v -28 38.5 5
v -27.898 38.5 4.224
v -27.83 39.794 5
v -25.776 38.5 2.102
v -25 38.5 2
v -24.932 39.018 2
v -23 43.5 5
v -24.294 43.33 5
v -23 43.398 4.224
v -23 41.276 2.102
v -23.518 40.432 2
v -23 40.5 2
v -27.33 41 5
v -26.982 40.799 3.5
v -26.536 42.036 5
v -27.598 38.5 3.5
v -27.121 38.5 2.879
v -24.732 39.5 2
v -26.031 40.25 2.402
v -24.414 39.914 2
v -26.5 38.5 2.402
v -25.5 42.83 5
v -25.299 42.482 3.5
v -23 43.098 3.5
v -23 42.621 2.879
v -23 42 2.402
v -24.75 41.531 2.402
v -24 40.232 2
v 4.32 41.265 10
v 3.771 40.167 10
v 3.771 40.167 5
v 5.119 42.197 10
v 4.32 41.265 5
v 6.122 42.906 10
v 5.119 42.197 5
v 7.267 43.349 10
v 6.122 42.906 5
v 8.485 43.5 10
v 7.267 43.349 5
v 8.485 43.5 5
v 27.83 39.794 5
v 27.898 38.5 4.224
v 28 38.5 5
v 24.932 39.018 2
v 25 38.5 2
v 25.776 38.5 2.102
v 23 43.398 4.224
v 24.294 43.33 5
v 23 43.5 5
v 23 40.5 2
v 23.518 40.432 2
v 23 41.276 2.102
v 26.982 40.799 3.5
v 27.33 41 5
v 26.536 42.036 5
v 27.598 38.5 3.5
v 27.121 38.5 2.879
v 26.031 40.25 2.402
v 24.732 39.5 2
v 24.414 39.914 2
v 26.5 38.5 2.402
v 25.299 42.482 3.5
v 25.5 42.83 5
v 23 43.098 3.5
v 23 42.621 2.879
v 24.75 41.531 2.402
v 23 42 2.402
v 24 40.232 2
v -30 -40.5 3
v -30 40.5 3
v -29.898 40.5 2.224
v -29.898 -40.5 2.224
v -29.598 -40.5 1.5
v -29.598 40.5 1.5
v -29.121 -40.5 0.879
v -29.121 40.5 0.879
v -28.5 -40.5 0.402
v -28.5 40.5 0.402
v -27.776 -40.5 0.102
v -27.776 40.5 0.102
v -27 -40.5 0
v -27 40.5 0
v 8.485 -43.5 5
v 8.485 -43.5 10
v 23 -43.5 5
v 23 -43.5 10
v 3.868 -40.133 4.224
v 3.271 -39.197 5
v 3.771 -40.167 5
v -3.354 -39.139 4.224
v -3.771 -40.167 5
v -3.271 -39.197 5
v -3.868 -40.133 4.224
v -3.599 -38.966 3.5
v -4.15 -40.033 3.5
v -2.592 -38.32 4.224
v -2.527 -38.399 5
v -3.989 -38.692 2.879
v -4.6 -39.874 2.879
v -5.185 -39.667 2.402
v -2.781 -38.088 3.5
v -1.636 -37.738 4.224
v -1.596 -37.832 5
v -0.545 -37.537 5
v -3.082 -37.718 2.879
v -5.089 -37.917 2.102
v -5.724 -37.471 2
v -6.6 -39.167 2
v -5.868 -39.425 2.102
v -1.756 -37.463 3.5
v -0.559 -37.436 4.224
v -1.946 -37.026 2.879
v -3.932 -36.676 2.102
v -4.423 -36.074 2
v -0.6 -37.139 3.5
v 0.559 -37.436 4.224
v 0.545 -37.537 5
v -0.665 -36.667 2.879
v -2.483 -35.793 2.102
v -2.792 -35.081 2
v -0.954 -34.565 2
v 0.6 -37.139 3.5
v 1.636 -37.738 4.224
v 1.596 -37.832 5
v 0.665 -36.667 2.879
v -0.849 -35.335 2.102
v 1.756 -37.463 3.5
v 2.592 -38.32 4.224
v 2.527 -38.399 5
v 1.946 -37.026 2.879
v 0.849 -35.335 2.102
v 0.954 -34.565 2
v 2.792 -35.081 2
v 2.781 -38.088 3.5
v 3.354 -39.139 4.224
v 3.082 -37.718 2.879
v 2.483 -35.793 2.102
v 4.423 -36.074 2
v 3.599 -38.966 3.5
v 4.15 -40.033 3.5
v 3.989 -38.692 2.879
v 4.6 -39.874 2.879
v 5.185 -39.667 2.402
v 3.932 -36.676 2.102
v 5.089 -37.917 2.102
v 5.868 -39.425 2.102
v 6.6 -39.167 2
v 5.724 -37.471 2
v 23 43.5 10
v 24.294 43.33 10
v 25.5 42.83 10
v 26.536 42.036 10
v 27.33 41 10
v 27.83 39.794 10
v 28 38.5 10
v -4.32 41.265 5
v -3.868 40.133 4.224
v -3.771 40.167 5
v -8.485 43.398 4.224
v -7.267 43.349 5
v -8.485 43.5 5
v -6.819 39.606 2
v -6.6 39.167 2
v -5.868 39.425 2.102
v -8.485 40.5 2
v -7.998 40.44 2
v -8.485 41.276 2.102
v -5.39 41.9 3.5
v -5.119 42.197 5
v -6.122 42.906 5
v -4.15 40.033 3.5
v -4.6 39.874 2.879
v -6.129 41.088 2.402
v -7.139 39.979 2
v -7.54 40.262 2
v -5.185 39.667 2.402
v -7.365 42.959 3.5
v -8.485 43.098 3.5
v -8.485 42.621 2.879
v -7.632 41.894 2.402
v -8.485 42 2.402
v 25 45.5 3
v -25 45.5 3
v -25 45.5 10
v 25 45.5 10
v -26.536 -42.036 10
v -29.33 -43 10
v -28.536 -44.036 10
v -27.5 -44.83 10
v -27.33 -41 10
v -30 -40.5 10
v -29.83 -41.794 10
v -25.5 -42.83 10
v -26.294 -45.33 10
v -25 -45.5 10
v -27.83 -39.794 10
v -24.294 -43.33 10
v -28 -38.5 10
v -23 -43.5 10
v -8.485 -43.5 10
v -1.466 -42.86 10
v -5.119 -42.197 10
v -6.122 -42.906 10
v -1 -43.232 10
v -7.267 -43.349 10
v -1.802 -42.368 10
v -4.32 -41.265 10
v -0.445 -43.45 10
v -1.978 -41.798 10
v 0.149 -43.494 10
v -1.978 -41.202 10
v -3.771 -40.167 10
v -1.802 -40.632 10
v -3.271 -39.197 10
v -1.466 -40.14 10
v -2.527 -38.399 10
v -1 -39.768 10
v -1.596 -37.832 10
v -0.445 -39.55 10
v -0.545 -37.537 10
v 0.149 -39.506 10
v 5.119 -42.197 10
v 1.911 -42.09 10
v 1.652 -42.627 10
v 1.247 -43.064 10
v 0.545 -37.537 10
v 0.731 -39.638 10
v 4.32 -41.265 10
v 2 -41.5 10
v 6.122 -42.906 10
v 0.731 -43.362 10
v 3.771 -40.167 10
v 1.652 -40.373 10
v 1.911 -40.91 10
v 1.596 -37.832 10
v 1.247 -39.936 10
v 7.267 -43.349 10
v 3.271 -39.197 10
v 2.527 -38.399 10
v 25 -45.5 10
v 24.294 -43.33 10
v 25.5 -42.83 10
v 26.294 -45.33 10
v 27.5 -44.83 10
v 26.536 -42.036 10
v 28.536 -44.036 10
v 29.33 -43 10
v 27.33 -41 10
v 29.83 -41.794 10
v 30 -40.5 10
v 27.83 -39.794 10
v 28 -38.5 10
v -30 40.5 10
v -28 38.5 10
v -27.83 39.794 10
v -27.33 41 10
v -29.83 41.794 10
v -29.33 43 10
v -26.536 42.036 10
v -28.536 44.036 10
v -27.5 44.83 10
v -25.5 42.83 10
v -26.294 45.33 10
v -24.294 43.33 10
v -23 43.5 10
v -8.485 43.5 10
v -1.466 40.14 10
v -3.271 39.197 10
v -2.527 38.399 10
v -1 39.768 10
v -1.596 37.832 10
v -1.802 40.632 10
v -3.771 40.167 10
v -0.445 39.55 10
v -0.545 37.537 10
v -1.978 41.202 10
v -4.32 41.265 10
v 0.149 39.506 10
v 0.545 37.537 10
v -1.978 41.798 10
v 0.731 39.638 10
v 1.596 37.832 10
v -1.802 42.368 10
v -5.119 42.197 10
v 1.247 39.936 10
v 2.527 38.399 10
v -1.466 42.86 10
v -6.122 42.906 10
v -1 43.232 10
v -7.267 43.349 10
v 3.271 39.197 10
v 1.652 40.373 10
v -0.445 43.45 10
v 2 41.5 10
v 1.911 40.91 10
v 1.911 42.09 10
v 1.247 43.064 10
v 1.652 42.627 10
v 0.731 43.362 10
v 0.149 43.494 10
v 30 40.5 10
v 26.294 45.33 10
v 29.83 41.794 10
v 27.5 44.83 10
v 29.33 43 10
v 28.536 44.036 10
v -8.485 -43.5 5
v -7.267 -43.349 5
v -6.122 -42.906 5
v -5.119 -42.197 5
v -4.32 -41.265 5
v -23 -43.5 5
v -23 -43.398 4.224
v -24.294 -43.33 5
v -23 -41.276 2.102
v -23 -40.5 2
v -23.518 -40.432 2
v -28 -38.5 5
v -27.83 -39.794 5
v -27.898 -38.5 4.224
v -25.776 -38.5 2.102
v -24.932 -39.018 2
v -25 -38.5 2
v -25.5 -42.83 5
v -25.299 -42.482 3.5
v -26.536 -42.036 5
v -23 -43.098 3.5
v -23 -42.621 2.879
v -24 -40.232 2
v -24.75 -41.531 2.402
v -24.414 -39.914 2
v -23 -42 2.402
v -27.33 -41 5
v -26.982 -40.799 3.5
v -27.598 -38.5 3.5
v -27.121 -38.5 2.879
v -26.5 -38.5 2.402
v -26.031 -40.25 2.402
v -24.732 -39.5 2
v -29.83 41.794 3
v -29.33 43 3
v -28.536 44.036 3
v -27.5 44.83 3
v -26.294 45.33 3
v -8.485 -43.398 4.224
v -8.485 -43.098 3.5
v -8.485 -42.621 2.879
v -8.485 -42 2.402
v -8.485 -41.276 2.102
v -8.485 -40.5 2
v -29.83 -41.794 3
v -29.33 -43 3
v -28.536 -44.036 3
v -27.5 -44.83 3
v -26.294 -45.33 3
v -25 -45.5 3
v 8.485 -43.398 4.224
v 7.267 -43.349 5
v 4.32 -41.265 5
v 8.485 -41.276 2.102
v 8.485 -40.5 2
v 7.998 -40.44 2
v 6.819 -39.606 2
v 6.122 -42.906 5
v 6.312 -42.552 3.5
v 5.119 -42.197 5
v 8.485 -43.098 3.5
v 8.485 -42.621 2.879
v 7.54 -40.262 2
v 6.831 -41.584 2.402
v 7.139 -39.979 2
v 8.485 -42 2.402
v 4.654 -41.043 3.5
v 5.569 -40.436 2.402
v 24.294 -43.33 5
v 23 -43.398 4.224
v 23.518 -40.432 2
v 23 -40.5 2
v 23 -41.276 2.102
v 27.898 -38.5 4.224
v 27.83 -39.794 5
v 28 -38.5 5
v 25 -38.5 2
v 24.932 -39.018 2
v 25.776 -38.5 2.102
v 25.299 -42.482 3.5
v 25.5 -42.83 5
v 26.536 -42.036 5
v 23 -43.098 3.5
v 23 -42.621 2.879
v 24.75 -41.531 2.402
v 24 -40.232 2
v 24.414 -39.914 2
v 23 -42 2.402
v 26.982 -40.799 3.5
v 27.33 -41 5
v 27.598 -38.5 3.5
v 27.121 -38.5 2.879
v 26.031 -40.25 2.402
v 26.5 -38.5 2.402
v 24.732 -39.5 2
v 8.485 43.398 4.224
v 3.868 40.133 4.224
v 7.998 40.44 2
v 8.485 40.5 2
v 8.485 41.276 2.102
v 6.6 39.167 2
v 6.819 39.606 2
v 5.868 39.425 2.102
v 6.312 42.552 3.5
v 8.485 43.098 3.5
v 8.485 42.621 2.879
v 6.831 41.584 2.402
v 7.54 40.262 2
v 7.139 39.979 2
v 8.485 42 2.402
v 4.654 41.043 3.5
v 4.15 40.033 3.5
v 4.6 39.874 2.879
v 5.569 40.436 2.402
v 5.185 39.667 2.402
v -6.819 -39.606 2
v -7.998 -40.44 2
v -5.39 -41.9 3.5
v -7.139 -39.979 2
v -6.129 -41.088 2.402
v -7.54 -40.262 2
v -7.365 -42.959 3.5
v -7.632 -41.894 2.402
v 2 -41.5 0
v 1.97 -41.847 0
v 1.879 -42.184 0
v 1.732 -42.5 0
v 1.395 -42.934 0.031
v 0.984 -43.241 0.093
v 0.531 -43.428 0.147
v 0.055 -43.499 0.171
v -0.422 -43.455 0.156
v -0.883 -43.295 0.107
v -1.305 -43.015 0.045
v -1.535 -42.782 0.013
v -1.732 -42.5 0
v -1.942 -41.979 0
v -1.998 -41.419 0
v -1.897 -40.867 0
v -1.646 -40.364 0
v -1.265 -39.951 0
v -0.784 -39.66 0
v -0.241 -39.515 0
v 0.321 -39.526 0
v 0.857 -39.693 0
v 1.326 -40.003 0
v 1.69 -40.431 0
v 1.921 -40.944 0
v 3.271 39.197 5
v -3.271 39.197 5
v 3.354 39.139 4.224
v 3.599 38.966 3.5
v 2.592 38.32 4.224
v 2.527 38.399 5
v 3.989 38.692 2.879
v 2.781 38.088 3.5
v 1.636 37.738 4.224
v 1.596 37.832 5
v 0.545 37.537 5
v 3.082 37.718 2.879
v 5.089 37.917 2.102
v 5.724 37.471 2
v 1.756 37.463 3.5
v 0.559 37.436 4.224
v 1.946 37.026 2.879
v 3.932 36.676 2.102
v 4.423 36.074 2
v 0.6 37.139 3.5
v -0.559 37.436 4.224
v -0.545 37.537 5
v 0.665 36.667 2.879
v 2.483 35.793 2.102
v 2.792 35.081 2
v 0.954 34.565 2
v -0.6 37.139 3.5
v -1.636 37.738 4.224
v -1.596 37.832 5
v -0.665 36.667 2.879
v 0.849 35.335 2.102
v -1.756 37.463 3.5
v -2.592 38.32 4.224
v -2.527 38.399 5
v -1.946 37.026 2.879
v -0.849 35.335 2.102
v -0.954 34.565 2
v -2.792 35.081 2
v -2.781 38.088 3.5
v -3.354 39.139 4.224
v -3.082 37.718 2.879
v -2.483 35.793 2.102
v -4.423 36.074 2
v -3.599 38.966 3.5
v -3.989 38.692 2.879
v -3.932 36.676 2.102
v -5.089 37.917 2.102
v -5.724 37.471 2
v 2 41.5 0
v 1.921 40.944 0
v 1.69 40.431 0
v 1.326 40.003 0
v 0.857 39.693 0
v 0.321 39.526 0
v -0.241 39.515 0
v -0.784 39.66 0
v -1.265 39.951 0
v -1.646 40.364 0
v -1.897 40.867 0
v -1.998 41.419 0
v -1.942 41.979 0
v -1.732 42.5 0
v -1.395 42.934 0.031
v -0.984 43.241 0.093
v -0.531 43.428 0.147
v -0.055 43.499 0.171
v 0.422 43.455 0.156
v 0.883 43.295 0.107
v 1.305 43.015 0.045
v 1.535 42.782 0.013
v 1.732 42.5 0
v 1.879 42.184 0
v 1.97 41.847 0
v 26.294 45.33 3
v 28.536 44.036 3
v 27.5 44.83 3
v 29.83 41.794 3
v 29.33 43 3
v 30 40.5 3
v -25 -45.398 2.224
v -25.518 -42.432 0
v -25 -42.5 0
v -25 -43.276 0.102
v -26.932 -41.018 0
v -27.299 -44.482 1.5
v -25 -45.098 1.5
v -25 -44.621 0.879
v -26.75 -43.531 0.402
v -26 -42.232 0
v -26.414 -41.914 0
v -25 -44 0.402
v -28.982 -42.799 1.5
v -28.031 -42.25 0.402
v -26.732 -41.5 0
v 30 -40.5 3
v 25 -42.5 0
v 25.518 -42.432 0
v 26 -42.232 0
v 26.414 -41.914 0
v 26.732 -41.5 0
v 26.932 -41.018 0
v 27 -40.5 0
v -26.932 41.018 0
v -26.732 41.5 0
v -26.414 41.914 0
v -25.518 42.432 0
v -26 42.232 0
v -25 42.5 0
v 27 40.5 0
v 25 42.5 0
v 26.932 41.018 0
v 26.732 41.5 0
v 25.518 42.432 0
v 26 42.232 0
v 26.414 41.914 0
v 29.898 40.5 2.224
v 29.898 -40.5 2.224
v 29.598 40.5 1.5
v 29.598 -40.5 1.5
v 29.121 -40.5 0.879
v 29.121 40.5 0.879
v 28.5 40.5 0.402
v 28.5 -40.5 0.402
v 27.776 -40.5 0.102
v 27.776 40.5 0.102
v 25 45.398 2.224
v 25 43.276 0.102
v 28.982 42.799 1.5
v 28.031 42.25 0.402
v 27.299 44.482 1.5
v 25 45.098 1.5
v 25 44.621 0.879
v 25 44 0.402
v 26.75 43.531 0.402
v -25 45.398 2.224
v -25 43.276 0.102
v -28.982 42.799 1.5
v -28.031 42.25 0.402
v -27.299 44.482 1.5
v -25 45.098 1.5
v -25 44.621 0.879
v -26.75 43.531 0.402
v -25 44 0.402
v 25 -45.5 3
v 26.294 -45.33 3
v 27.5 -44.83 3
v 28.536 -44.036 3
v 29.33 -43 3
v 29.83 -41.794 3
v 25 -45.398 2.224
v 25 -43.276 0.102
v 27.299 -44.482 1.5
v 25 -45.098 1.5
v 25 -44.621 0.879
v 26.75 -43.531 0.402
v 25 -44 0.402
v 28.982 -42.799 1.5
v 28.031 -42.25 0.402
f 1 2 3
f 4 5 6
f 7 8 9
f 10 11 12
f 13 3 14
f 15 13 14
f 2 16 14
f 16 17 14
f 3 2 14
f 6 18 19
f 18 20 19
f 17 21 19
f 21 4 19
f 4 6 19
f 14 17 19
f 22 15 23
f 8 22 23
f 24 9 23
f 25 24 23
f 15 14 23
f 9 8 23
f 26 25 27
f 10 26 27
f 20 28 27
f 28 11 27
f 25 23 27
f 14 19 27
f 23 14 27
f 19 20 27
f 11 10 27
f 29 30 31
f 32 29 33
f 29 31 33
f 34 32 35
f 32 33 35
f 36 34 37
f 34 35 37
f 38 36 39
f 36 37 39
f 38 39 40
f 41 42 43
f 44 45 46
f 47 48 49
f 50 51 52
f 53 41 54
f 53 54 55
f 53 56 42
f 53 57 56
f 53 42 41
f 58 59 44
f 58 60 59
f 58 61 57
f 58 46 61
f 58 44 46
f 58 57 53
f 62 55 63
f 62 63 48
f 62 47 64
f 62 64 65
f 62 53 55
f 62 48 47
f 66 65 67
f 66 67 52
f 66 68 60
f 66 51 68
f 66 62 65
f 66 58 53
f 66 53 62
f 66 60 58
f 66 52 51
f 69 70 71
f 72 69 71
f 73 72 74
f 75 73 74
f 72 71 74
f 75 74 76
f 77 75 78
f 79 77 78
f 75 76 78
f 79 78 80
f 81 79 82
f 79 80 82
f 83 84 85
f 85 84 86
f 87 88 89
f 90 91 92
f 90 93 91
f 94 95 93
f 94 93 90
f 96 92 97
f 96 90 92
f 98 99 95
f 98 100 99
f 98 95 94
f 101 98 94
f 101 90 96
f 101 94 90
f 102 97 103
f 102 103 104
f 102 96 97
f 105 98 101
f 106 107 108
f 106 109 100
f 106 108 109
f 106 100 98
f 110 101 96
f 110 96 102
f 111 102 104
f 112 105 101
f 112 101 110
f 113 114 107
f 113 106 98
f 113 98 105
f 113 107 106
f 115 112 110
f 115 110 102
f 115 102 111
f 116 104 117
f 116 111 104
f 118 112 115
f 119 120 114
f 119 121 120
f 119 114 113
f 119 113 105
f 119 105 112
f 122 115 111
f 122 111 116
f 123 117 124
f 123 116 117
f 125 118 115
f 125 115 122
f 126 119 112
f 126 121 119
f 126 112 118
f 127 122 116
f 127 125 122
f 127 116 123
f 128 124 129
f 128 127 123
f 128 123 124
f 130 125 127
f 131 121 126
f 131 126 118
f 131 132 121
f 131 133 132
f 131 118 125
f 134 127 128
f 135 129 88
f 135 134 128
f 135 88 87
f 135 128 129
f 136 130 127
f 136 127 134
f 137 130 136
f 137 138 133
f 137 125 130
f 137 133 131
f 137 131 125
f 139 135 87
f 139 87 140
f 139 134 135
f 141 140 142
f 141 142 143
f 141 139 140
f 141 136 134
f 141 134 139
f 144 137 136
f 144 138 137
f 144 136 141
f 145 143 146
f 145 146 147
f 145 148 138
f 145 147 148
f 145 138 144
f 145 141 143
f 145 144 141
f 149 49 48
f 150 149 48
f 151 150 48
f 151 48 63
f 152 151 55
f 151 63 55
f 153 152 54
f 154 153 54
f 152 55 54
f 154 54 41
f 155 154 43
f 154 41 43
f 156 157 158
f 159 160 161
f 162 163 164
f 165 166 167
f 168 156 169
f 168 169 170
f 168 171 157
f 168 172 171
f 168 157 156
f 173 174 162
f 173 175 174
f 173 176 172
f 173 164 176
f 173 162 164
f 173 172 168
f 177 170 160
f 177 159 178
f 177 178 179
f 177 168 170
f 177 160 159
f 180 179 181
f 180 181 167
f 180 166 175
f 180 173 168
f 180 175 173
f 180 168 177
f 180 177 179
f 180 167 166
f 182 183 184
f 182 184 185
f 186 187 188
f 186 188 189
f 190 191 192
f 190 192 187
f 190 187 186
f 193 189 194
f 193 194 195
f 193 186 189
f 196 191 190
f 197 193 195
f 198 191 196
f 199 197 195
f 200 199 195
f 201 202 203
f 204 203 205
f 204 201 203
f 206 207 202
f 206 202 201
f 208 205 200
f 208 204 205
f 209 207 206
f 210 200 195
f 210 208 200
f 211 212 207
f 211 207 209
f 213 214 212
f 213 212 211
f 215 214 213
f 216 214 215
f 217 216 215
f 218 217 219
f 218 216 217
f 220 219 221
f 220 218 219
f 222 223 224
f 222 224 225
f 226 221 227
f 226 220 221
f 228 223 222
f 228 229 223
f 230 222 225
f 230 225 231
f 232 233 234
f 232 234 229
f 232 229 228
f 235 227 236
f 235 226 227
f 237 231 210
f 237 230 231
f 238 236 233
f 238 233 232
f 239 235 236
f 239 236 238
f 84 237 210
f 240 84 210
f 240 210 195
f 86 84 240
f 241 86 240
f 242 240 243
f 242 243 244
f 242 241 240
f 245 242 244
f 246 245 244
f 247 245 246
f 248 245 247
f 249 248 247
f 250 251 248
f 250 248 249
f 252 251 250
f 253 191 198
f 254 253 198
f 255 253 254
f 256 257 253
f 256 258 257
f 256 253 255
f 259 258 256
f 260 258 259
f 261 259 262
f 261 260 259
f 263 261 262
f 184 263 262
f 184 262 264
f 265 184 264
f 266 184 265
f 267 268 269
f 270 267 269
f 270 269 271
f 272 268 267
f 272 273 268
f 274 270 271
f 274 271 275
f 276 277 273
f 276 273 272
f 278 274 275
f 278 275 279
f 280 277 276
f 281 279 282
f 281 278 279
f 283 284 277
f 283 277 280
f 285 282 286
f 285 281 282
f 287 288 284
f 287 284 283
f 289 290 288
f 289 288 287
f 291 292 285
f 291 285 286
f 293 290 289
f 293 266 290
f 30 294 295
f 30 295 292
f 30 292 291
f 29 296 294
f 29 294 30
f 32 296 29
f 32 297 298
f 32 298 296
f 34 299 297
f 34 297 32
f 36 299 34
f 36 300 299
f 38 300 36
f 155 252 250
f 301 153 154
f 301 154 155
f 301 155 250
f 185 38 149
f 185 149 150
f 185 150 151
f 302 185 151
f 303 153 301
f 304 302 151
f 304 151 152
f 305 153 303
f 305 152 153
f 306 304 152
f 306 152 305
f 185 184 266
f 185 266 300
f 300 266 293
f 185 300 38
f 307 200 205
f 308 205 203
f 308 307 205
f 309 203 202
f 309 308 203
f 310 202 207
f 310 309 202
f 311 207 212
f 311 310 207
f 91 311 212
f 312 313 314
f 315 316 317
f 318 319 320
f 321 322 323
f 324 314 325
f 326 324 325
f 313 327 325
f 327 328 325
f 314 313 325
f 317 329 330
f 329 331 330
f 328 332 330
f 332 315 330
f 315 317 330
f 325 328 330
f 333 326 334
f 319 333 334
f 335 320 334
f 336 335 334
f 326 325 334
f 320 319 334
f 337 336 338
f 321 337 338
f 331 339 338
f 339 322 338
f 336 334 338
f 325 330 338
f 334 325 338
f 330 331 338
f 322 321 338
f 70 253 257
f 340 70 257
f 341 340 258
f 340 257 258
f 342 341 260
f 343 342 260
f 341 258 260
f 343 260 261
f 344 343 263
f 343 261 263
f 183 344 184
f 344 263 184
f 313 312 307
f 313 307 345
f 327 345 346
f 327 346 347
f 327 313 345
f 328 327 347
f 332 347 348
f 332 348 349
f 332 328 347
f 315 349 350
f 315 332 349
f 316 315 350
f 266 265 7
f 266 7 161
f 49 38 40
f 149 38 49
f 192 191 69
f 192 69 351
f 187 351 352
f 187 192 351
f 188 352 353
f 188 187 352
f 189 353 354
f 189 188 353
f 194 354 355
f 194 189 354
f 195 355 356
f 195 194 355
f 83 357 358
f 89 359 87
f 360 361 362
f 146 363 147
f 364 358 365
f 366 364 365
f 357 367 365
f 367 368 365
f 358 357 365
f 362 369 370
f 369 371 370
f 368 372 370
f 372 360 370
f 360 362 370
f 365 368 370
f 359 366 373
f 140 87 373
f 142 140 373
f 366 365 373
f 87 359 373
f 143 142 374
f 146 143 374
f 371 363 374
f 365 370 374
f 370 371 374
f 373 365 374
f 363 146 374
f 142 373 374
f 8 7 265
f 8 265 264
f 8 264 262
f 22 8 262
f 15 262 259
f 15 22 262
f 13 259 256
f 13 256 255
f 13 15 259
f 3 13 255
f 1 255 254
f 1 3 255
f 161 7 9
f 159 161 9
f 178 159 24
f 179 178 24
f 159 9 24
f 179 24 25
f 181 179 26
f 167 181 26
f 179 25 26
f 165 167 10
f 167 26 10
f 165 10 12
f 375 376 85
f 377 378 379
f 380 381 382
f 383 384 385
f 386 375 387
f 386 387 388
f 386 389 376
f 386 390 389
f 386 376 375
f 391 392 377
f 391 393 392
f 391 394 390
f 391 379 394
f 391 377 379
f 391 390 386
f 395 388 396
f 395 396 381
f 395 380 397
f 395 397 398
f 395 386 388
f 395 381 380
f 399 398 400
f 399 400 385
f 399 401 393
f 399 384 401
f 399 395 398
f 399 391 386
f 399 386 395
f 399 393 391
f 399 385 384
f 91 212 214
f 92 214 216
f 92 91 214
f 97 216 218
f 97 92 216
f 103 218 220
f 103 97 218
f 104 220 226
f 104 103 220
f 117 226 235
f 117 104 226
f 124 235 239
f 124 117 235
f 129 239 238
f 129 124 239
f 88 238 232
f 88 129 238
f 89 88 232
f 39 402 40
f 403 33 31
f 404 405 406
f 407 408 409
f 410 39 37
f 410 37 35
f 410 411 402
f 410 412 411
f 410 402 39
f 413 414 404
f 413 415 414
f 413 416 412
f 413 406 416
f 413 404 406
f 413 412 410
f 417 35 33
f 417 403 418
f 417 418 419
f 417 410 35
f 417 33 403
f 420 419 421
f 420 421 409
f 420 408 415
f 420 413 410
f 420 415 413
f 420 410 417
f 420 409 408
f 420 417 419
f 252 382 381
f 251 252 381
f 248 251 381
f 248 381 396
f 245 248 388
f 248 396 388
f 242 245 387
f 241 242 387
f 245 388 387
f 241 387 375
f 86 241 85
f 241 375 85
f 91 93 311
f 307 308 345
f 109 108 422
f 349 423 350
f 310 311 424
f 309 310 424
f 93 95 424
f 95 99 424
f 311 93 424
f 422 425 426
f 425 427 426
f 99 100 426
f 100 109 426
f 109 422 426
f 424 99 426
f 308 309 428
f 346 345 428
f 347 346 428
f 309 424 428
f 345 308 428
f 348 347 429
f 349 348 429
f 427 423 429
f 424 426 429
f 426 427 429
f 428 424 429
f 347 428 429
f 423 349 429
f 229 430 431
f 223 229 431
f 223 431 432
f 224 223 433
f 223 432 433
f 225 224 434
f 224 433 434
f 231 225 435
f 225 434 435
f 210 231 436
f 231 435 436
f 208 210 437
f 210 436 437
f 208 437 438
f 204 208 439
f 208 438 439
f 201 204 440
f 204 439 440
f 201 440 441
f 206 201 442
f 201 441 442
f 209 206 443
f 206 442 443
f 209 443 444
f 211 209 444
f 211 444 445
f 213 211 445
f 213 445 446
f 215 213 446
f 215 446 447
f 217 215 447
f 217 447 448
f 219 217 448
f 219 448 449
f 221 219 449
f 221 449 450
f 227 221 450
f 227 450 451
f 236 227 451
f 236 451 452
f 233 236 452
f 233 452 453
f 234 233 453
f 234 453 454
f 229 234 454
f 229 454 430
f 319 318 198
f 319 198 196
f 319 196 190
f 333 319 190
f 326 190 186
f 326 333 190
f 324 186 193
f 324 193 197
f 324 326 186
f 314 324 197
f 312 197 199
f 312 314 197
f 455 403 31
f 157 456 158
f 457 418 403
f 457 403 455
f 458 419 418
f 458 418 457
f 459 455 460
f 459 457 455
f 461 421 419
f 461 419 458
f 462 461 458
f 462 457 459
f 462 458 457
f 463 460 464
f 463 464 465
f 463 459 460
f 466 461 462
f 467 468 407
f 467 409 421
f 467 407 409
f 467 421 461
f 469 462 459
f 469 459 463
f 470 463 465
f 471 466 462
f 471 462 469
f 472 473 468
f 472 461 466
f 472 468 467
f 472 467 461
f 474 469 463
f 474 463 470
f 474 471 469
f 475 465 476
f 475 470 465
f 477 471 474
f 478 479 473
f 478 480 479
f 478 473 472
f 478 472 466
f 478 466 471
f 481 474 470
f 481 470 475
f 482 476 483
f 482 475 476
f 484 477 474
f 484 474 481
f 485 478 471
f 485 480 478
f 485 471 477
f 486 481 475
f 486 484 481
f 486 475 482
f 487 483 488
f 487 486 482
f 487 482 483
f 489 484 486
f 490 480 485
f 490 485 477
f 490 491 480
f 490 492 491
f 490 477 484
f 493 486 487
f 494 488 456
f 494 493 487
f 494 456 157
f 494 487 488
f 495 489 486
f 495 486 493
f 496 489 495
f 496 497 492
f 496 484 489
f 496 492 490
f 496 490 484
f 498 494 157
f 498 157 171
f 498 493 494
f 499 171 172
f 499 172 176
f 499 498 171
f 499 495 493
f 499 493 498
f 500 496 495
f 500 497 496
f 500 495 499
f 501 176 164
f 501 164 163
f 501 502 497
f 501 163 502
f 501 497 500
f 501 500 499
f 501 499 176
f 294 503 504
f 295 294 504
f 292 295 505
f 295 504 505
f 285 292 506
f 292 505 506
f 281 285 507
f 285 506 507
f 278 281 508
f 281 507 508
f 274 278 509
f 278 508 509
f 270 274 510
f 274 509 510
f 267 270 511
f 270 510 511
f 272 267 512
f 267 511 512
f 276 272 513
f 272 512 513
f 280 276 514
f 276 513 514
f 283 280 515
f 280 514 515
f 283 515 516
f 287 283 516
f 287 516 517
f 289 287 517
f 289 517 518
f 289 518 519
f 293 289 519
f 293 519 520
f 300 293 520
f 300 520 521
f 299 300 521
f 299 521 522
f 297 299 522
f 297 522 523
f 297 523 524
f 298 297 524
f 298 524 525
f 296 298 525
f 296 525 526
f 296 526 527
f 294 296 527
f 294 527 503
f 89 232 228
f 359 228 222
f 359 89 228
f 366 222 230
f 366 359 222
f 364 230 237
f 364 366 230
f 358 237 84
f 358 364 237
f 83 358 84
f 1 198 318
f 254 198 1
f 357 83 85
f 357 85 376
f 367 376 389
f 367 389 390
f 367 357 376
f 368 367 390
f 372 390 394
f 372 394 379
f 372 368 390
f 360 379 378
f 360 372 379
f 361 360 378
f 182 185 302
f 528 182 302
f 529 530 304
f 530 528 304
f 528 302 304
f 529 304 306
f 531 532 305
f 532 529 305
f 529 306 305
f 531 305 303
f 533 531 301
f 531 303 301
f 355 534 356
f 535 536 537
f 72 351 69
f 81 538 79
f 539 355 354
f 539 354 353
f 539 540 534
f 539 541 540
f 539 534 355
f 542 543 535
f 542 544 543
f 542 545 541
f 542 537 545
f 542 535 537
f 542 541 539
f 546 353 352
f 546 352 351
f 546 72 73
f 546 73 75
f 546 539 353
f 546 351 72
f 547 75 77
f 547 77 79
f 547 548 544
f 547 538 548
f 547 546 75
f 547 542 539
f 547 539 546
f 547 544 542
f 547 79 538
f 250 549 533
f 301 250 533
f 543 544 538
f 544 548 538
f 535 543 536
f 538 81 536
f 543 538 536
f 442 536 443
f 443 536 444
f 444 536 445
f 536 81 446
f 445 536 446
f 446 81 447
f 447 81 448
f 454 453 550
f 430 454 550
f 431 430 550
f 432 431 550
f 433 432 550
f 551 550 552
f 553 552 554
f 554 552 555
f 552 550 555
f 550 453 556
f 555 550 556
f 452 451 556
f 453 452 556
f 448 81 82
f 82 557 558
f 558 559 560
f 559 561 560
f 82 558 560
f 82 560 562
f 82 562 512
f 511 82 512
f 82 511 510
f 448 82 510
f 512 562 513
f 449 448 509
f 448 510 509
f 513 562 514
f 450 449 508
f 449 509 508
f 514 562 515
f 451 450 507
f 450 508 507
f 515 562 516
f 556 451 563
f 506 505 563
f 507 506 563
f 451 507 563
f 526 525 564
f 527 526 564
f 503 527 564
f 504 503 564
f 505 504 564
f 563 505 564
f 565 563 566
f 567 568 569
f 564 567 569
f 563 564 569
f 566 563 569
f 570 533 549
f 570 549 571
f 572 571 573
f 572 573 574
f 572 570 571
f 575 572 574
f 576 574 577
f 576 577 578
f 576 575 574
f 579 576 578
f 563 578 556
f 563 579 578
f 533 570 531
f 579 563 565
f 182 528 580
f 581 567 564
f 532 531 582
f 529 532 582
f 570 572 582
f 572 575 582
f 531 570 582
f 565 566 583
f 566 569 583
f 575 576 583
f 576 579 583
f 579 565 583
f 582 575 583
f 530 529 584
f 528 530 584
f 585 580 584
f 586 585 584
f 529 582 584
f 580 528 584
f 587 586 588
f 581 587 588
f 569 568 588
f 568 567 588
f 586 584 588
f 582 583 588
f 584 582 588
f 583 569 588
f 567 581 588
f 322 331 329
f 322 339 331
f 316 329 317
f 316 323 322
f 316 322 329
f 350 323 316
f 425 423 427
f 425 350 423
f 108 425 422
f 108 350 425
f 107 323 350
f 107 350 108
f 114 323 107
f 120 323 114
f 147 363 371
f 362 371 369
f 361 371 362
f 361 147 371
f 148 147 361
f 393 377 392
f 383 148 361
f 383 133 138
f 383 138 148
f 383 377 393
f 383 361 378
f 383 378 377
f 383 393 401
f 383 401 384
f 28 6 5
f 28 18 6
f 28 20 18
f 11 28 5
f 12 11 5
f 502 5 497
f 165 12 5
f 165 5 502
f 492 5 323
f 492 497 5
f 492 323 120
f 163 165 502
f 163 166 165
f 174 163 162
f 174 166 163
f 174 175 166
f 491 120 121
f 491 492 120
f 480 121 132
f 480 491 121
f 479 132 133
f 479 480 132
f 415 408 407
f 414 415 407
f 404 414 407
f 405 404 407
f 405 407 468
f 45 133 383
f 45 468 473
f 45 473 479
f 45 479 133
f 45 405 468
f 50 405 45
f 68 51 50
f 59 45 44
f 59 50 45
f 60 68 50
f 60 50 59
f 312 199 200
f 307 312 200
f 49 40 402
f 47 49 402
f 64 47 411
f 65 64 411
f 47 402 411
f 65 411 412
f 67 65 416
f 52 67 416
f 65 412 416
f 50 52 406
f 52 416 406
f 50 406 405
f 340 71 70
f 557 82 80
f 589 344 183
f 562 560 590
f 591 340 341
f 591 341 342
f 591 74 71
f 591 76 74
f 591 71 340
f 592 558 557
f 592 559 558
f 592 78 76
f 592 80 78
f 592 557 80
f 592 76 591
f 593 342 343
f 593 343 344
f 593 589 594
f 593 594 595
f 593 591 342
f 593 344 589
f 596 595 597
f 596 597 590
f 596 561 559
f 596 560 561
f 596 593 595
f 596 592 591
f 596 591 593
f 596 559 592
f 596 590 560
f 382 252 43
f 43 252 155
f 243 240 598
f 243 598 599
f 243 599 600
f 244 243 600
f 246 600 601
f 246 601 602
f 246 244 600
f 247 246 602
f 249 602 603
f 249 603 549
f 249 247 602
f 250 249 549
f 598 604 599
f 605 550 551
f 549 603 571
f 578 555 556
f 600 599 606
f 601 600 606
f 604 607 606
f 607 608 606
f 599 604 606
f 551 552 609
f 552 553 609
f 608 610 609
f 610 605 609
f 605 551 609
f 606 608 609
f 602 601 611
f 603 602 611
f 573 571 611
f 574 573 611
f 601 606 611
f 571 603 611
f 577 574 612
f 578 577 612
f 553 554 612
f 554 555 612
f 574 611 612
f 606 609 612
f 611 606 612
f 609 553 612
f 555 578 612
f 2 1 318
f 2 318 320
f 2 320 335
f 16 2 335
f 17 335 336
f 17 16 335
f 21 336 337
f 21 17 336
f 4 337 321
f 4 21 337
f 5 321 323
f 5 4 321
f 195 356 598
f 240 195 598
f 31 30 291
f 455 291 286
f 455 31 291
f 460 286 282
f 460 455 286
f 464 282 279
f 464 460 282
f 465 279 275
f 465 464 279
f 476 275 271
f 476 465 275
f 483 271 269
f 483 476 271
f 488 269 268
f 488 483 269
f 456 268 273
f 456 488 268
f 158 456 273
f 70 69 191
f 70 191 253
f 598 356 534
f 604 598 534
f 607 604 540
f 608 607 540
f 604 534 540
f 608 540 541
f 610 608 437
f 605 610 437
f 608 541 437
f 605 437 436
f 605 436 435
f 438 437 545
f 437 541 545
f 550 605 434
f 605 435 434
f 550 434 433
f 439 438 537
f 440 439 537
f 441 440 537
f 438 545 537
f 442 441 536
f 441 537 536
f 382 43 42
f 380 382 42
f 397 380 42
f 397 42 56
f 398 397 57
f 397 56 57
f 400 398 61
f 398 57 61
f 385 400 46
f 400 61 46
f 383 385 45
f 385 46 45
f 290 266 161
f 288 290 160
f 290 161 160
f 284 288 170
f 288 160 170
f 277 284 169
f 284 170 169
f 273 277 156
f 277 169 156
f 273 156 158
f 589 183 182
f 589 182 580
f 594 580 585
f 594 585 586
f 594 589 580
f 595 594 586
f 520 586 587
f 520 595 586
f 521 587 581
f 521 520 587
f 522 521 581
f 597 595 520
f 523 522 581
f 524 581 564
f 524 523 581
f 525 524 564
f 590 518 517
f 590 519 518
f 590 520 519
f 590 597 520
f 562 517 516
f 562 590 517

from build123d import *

# Parameters (mm, degrees)
F3_W          = 60
F3_H          = 91
F4_DEPTH      = 10
F5_W          = 56
F5_H          = 87
F6_DEPTH      = 8
F7_R          = 4
F8_DEPTH      = 10
F9_R          = 2
F10_DEPTH     = 10.001
F11_R         = 5
F12_R         = 5
F13_T1_DEPTH  = 77
F13_T3_DEPTH  = 14.5147186258
F13_T5_DEPTH  = 14.5147186258
F13_T8_ANGLE  = 90
F13_T10_ANGLE = 70.5287793655
F13_T12_ANGLE = 141.057558731
F13_T14_ANGLE = 90
F13_T16_ANGLE = 70.5287793655
F13_T18_ANGLE = 70.5287793655
F13_T20_ANGLE = 90
F13_T22_ANGLE = 141.057558731
F13_T24_ANGLE = 70.5287793655
F13_T26_ANGLE = 90
F13_T27_DEPTH = 81
F13_T29_DEPTH = 50
F13_T32_ANGLE = 90
F13_T34_ANGLE = 90
F13_T36_ANGLE = 90
F13_T38_ANGLE = 90


# Not quite as in the source:
# - a fillet or chamfer that OpenCascade refuses, or shapes differently, is made with other operations: its cross-section is extruded or revolved along the edge and cut away or added


with BuildPart() as f4:
    # F3 (on Top) → F4 (new body)
    with BuildSketch(Plane.XY):
        Rectangle(F3_W, F3_H)
    extrude(amount=F4_DEPTH)

    # F5 (on face) → F6 (cut)
    with BuildSketch(Plane.XY.offset(10)):
        Rectangle(F5_W, F5_H)
    extrude(amount=-F6_DEPTH, mode=Mode.SUBTRACT)

    # F7 (on face) → F8 (join)
    with BuildSketch(Plane(origin=(0, 0, 0), x_dir=(1, 0, 0), z_dir=(0, 0, -1))):
        with Locations((0, -41.5)):
            Circle(F7_R)
        with Locations((0, 41.5)):
            Circle(F7_R)
    extrude(amount=-F8_DEPTH)

    # F9 (on face) → F10 (cut, through all)
    with BuildSketch(Plane(origin=(0, 0, 0), x_dir=(1, 0, 0), z_dir=(0, 0, -1))):
        with Locations((0, -41.5)):
            Circle(F9_R)
        with Locations((0, 41.5)):
            Circle(F9_R)
    extrude(amount=-F10_DEPTH, mode=Mode.SUBTRACT)

    # F11
    f11_edges = [f4.edges().sort_by_distance(p)[0] for p in [
        (3.464102, 43.5, 6),
        (-3.464102, 43.5, 6),
        (-3.464102, -43.5, 6),
        (3.464102, -43.5, 6),
    ]]
    fillet(f11_edges, radius=F11_R)

    # F12
    f12_edges = [f4.edges().sort_by_distance(p)[0] for p in [
        (30, -45.5, 5),
        (-30, -45.5, 5),
        (30, 45.5, 5),
        (-30, 45.5, 5),
        (28, -43.5, 6),
        (-28, -43.5, 6),
        (-28, 43.5, 6),
        (28, 43.5, 6),
    ]]
    fillet(f12_edges, radius=F12_R)

    # F13: fillet of radius 3 on 24 edges, made by hand

    # F13_s2 → F13_t1 (join)
    with BuildSketch(Plane.XZ.offset(-38.5)):
        with BuildLine():
            ThreePointArc((-28, 5), (-27.1213203436, 2.8786796564), (-25, 2))
            Line((-25, 2), (-28, 2))
            Line((-28, 2), (-28, 5))
        make_face()
        with BuildLine():
            ThreePointArc((28, 5), (27.1213203436, 2.8786796564), (25, 2))
            Line((25, 2), (28, 2))
            Line((28, 2), (28, 5))
        make_face()
    extrude(amount=F13_T1_DEPTH)

    # F13_s4 → F13_t3 (join)
    with BuildSketch(Plane.YZ.offset(8.4852813742)):
        with BuildLine():
            ThreePointArc((-43.5, 5), (-42.6213203436, 2.8786796564), (-40.5, 2))
            Line((-40.5, 2), (-43.5, 2))
            Line((-43.5, 2), (-43.5, 5))
        make_face()
        with BuildLine():
            ThreePointArc((43.5, 5), (42.6213203436, 2.8786796564), (40.5, 2))
            Line((40.5, 2), (43.5, 2))
            Line((43.5, 2), (43.5, 5))
        make_face()
    extrude(amount=F13_T3_DEPTH)

    # F13_s6 → F13_t5 (join)
    with BuildSketch(Plane.YZ.offset(-23)):
        with BuildLine():
            ThreePointArc((-43.5, 5), (-42.6213203436, 2.8786796564), (-40.5, 2))
            Line((-40.5, 2), (-43.5, 2))
            Line((-43.5, 2), (-43.5, 5))
        make_face()
        with BuildLine():
            ThreePointArc((43.5, 5), (42.6213203436, 2.8786796564), (40.5, 2))
            Line((40.5, 2), (43.5, 2))
            Line((43.5, 2), (43.5, 5))
        make_face()
    extrude(amount=F13_T5_DEPTH)

    # F13_s7 → F13_t8 (revolve)
    with BuildSketch(Plane.YZ.offset(23)):
        with BuildLine():
            ThreePointArc((-43.5, 5), (-42.6213203436, 2.8786796564), (-40.5, 2))
            Line((-40.5, 2), (-43.5, 2))
            Line((-43.5, 2), (-43.5, 5))
        make_face()
    revolve(axis=Axis((23, -38.5, 2), (0, 0, 1)), revolution_arc=F13_T8_ANGLE)

    # F13_s9 → F13_t10 (revolve)
    with BuildSketch(Plane.YZ.offset(8.4852813742)):
        with BuildLine():
            ThreePointArc((-43.5, 5), (-42.6213203436, 2.8786796564), (-40.5, 2))
            Line((-40.5, 2), (-43.5, 2))
            Line((-43.5, 2), (-43.5, 5))
        make_face()
    revolve(axis=Axis((8.4852813742, -38.5, 2), (0, 0, -1)), revolution_arc=F13_T10_ANGLE)

    # F13_s11 → F13_t12 (revolve)
    with BuildSketch(Plane(origin=(-13.0421917419, -36.8888888889, 0), x_dir=(0, 0, 1), z_dir=(-0.3333333333, -0.9428090416, 0))):
        with BuildLine():
            ThreePointArc((5, -9.8333333333), (2.8786796564, -8.9546536769), (2, -6.8333333333))
            Line((2, -6.8333333333), (2, -9.8333333333))
            Line((2, -9.8333333333), (5, -9.8333333333))
        make_face()
    revolve(axis=Axis((0, -41.5, 2), (0, 0, -1)), revolution_arc=F13_T12_ANGLE)

    # F13_s13 → F13_t14 (revolve)
    with BuildSketch(Plane.XZ.offset(-38.5)):
        with BuildLine():
            ThreePointArc((28, 5), (27.1213203436, 2.8786796564), (25, 2))
            Line((25, 2), (28, 2))
            Line((28, 2), (28, 5))
        make_face()
    revolve(axis=Axis((23, 38.5, 2), (0, 0, 1)), revolution_arc=F13_T14_ANGLE)

    # F13_s15 → F13_t16 (revolve)
    with BuildSketch(Plane(origin=(-13.0421917419, -36.8888888889, 0), x_dir=(0, 0, 1), z_dir=(0.3333333333, 0.9428090416, 0))):
        with BuildLine():
            ThreePointArc((5, 9.8333333333), (2.8786796564, 8.9546536769), (2, 6.8333333333))
            Line((2, 6.8333333333), (2, 9.8333333333))
            Line((2, 9.8333333333), (5, 9.8333333333))
        make_face()
    revolve(axis=Axis((-8.4852813742, -38.5, 2), (0, 0, -1)), revolution_arc=F13_T16_ANGLE)

    # F13_s17 → F13_t18 (revolve)
    with BuildSketch(Plane.YZ.offset(8.4852813742)):
        with BuildLine():
            ThreePointArc((43.5, 5), (42.6213203436, 2.8786796564), (40.5, 2))
            Line((40.5, 2), (43.5, 2))
            Line((43.5, 2), (43.5, 5))
        make_face()
    revolve(axis=Axis((8.4852813742, 38.5, 2), (0, 0, 1)), revolution_arc=F13_T18_ANGLE)

    # F13_s19 → F13_t20 (revolve)
    with BuildSketch(Plane.YZ.offset(-23)):
        with BuildLine():
            ThreePointArc((-43.5, 5), (-42.6213203436, 2.8786796564), (-40.5, 2))
            Line((-40.5, 2), (-43.5, 2))
            Line((-43.5, 2), (-43.5, 5))
        make_face()
    revolve(axis=Axis((-23, -38.5, 2), (0, 0, -1)), revolution_arc=F13_T20_ANGLE)

    # F13_s21 → F13_t22 (revolve)
    with BuildSketch(Plane(origin=(13.0421917419, 36.8888888889, 0), x_dir=(0, 0, 1), z_dir=(0.3333333333, 0.9428090416, 0))):
        with BuildLine():
            ThreePointArc((5, -9.8333333333), (2.8786796564, -8.9546536769), (2, -6.8333333333))
            Line((2, -6.8333333333), (2, -9.8333333333))
            Line((2, -9.8333333333), (5, -9.8333333333))
        make_face()
    revolve(axis=Axis((0, 41.5, 2), (0, 0, -1)), revolution_arc=F13_T22_ANGLE)

    # F13_s23 → F13_t24 (revolve)
    with BuildSketch(Plane(origin=(-13.0421917419, 36.8888888889, 0), x_dir=(0, 0, 1), z_dir=(0.3333333333, -0.9428090416, 0))):
        with BuildLine():
            ThreePointArc((5, -9.8333333333), (2.8786796564, -8.9546536769), (2, -6.8333333333))
            Line((2, -6.8333333333), (2, -9.8333333333))
            Line((2, -9.8333333333), (5, -9.8333333333))
        make_face()
    revolve(axis=Axis((-8.4852813742, 38.5, 2), (0, 0, 1)), revolution_arc=F13_T24_ANGLE)

    # F13_s25 → F13_t26 (revolve)
    with BuildSketch(Plane.XZ.offset(-38.5)):
        with BuildLine():
            ThreePointArc((-28, 5), (-27.1213203436, 2.8786796564), (-25, 2))
            Line((-25, 2), (-28, 2))
            Line((-28, 2), (-28, 5))
        make_face()
    revolve(axis=Axis((-23, 38.5, 2), (0, 0, -1)), revolution_arc=F13_T26_ANGLE)

    # F13_s28 → F13_t27 (cut)
    with BuildSketch(Plane.XZ.offset(-40.5)):
        with BuildLine():
            ThreePointArc((30, 3), (29.1213203436, 0.8786796564), (27, 0))
            Line((27, 0), (30, 0))
            Line((30, 0), (30, 3))
        make_face()
        with BuildLine():
            ThreePointArc((-30, 3), (-29.1213203436, 0.8786796564), (-27, 0))
            Line((-27, 0), (-30, 0))
            Line((-30, 0), (-30, 3))
        make_face()
    extrude(amount=F13_T27_DEPTH, mode=Mode.SUBTRACT)

    # F13_s30 → F13_t29 (cut)
    with BuildSketch(Plane.YZ.offset(-25)):
        with BuildLine():
            ThreePointArc((-45.5, 3), (-44.6213203436, 0.8786796564), (-42.5, 0))
            Line((-42.5, 0), (-45.5, 0))
            Line((-45.5, 0), (-45.5, 3))
        make_face()
        with BuildLine():
            ThreePointArc((45.5, 3), (44.6213203436, 0.8786796564), (42.5, 0))
            Line((42.5, 0), (45.5, 0))
            Line((45.5, 0), (45.5, 3))
        make_face()
    extrude(amount=F13_T29_DEPTH, mode=Mode.SUBTRACT)

    # F13_s31 → F13_t32 (revolve, cut)
    with BuildSketch(Plane.YZ.offset(25)):
        with BuildLine():
            ThreePointArc((-45.5, 3), (-44.6213203436, 0.8786796564), (-42.5, 0))
            Line((-42.5, 0), (-45.5, 0))
            Line((-45.5, 0), (-45.5, 3))
        make_face()
    revolve(axis=Axis((25, -40.5, 0), (0, 0, 1)), revolution_arc=F13_T32_ANGLE, mode=Mode.SUBTRACT)

    # F13_s33 → F13_t34 (revolve, cut)
    with BuildSketch(Plane.YZ.offset(-25)):
        with BuildLine():
            ThreePointArc((-45.5, 3), (-44.6213203436, 0.8786796564), (-42.5, 0))
            Line((-42.5, 0), (-45.5, 0))
            Line((-45.5, 0), (-45.5, 3))
        make_face()
    revolve(axis=Axis((-25, -40.5, 0), (0, 0, -1)), revolution_arc=F13_T34_ANGLE, mode=Mode.SUBTRACT)

    # F13_s35 → F13_t36 (revolve, cut)
    with BuildSketch(Plane.XZ.offset(-40.5)):
        with BuildLine():
            ThreePointArc((30, 3), (29.1213203436, 0.8786796564), (27, 0))
            Line((27, 0), (30, 0))
            Line((30, 0), (30, 3))
        make_face()
    revolve(axis=Axis((25, 40.5, 0), (0, 0, 1)), revolution_arc=F13_T36_ANGLE, mode=Mode.SUBTRACT)

    # F13_s37 → F13_t38 (revolve, cut)
    with BuildSketch(Plane.XZ.offset(-40.5)):
        with BuildLine():
            ThreePointArc((-30, 3), (-29.1213203436, 0.8786796564), (-27, 0))
            Line((-27, 0), (-30, 0))
            Line((-30, 0), (-30, 3))
        make_face()
    revolve(axis=Axis((-25, 40.5, 0), (0, 0, -1)), revolution_arc=F13_T38_ANGLE, mode=Mode.SUBTRACT)


solid = f4.part
